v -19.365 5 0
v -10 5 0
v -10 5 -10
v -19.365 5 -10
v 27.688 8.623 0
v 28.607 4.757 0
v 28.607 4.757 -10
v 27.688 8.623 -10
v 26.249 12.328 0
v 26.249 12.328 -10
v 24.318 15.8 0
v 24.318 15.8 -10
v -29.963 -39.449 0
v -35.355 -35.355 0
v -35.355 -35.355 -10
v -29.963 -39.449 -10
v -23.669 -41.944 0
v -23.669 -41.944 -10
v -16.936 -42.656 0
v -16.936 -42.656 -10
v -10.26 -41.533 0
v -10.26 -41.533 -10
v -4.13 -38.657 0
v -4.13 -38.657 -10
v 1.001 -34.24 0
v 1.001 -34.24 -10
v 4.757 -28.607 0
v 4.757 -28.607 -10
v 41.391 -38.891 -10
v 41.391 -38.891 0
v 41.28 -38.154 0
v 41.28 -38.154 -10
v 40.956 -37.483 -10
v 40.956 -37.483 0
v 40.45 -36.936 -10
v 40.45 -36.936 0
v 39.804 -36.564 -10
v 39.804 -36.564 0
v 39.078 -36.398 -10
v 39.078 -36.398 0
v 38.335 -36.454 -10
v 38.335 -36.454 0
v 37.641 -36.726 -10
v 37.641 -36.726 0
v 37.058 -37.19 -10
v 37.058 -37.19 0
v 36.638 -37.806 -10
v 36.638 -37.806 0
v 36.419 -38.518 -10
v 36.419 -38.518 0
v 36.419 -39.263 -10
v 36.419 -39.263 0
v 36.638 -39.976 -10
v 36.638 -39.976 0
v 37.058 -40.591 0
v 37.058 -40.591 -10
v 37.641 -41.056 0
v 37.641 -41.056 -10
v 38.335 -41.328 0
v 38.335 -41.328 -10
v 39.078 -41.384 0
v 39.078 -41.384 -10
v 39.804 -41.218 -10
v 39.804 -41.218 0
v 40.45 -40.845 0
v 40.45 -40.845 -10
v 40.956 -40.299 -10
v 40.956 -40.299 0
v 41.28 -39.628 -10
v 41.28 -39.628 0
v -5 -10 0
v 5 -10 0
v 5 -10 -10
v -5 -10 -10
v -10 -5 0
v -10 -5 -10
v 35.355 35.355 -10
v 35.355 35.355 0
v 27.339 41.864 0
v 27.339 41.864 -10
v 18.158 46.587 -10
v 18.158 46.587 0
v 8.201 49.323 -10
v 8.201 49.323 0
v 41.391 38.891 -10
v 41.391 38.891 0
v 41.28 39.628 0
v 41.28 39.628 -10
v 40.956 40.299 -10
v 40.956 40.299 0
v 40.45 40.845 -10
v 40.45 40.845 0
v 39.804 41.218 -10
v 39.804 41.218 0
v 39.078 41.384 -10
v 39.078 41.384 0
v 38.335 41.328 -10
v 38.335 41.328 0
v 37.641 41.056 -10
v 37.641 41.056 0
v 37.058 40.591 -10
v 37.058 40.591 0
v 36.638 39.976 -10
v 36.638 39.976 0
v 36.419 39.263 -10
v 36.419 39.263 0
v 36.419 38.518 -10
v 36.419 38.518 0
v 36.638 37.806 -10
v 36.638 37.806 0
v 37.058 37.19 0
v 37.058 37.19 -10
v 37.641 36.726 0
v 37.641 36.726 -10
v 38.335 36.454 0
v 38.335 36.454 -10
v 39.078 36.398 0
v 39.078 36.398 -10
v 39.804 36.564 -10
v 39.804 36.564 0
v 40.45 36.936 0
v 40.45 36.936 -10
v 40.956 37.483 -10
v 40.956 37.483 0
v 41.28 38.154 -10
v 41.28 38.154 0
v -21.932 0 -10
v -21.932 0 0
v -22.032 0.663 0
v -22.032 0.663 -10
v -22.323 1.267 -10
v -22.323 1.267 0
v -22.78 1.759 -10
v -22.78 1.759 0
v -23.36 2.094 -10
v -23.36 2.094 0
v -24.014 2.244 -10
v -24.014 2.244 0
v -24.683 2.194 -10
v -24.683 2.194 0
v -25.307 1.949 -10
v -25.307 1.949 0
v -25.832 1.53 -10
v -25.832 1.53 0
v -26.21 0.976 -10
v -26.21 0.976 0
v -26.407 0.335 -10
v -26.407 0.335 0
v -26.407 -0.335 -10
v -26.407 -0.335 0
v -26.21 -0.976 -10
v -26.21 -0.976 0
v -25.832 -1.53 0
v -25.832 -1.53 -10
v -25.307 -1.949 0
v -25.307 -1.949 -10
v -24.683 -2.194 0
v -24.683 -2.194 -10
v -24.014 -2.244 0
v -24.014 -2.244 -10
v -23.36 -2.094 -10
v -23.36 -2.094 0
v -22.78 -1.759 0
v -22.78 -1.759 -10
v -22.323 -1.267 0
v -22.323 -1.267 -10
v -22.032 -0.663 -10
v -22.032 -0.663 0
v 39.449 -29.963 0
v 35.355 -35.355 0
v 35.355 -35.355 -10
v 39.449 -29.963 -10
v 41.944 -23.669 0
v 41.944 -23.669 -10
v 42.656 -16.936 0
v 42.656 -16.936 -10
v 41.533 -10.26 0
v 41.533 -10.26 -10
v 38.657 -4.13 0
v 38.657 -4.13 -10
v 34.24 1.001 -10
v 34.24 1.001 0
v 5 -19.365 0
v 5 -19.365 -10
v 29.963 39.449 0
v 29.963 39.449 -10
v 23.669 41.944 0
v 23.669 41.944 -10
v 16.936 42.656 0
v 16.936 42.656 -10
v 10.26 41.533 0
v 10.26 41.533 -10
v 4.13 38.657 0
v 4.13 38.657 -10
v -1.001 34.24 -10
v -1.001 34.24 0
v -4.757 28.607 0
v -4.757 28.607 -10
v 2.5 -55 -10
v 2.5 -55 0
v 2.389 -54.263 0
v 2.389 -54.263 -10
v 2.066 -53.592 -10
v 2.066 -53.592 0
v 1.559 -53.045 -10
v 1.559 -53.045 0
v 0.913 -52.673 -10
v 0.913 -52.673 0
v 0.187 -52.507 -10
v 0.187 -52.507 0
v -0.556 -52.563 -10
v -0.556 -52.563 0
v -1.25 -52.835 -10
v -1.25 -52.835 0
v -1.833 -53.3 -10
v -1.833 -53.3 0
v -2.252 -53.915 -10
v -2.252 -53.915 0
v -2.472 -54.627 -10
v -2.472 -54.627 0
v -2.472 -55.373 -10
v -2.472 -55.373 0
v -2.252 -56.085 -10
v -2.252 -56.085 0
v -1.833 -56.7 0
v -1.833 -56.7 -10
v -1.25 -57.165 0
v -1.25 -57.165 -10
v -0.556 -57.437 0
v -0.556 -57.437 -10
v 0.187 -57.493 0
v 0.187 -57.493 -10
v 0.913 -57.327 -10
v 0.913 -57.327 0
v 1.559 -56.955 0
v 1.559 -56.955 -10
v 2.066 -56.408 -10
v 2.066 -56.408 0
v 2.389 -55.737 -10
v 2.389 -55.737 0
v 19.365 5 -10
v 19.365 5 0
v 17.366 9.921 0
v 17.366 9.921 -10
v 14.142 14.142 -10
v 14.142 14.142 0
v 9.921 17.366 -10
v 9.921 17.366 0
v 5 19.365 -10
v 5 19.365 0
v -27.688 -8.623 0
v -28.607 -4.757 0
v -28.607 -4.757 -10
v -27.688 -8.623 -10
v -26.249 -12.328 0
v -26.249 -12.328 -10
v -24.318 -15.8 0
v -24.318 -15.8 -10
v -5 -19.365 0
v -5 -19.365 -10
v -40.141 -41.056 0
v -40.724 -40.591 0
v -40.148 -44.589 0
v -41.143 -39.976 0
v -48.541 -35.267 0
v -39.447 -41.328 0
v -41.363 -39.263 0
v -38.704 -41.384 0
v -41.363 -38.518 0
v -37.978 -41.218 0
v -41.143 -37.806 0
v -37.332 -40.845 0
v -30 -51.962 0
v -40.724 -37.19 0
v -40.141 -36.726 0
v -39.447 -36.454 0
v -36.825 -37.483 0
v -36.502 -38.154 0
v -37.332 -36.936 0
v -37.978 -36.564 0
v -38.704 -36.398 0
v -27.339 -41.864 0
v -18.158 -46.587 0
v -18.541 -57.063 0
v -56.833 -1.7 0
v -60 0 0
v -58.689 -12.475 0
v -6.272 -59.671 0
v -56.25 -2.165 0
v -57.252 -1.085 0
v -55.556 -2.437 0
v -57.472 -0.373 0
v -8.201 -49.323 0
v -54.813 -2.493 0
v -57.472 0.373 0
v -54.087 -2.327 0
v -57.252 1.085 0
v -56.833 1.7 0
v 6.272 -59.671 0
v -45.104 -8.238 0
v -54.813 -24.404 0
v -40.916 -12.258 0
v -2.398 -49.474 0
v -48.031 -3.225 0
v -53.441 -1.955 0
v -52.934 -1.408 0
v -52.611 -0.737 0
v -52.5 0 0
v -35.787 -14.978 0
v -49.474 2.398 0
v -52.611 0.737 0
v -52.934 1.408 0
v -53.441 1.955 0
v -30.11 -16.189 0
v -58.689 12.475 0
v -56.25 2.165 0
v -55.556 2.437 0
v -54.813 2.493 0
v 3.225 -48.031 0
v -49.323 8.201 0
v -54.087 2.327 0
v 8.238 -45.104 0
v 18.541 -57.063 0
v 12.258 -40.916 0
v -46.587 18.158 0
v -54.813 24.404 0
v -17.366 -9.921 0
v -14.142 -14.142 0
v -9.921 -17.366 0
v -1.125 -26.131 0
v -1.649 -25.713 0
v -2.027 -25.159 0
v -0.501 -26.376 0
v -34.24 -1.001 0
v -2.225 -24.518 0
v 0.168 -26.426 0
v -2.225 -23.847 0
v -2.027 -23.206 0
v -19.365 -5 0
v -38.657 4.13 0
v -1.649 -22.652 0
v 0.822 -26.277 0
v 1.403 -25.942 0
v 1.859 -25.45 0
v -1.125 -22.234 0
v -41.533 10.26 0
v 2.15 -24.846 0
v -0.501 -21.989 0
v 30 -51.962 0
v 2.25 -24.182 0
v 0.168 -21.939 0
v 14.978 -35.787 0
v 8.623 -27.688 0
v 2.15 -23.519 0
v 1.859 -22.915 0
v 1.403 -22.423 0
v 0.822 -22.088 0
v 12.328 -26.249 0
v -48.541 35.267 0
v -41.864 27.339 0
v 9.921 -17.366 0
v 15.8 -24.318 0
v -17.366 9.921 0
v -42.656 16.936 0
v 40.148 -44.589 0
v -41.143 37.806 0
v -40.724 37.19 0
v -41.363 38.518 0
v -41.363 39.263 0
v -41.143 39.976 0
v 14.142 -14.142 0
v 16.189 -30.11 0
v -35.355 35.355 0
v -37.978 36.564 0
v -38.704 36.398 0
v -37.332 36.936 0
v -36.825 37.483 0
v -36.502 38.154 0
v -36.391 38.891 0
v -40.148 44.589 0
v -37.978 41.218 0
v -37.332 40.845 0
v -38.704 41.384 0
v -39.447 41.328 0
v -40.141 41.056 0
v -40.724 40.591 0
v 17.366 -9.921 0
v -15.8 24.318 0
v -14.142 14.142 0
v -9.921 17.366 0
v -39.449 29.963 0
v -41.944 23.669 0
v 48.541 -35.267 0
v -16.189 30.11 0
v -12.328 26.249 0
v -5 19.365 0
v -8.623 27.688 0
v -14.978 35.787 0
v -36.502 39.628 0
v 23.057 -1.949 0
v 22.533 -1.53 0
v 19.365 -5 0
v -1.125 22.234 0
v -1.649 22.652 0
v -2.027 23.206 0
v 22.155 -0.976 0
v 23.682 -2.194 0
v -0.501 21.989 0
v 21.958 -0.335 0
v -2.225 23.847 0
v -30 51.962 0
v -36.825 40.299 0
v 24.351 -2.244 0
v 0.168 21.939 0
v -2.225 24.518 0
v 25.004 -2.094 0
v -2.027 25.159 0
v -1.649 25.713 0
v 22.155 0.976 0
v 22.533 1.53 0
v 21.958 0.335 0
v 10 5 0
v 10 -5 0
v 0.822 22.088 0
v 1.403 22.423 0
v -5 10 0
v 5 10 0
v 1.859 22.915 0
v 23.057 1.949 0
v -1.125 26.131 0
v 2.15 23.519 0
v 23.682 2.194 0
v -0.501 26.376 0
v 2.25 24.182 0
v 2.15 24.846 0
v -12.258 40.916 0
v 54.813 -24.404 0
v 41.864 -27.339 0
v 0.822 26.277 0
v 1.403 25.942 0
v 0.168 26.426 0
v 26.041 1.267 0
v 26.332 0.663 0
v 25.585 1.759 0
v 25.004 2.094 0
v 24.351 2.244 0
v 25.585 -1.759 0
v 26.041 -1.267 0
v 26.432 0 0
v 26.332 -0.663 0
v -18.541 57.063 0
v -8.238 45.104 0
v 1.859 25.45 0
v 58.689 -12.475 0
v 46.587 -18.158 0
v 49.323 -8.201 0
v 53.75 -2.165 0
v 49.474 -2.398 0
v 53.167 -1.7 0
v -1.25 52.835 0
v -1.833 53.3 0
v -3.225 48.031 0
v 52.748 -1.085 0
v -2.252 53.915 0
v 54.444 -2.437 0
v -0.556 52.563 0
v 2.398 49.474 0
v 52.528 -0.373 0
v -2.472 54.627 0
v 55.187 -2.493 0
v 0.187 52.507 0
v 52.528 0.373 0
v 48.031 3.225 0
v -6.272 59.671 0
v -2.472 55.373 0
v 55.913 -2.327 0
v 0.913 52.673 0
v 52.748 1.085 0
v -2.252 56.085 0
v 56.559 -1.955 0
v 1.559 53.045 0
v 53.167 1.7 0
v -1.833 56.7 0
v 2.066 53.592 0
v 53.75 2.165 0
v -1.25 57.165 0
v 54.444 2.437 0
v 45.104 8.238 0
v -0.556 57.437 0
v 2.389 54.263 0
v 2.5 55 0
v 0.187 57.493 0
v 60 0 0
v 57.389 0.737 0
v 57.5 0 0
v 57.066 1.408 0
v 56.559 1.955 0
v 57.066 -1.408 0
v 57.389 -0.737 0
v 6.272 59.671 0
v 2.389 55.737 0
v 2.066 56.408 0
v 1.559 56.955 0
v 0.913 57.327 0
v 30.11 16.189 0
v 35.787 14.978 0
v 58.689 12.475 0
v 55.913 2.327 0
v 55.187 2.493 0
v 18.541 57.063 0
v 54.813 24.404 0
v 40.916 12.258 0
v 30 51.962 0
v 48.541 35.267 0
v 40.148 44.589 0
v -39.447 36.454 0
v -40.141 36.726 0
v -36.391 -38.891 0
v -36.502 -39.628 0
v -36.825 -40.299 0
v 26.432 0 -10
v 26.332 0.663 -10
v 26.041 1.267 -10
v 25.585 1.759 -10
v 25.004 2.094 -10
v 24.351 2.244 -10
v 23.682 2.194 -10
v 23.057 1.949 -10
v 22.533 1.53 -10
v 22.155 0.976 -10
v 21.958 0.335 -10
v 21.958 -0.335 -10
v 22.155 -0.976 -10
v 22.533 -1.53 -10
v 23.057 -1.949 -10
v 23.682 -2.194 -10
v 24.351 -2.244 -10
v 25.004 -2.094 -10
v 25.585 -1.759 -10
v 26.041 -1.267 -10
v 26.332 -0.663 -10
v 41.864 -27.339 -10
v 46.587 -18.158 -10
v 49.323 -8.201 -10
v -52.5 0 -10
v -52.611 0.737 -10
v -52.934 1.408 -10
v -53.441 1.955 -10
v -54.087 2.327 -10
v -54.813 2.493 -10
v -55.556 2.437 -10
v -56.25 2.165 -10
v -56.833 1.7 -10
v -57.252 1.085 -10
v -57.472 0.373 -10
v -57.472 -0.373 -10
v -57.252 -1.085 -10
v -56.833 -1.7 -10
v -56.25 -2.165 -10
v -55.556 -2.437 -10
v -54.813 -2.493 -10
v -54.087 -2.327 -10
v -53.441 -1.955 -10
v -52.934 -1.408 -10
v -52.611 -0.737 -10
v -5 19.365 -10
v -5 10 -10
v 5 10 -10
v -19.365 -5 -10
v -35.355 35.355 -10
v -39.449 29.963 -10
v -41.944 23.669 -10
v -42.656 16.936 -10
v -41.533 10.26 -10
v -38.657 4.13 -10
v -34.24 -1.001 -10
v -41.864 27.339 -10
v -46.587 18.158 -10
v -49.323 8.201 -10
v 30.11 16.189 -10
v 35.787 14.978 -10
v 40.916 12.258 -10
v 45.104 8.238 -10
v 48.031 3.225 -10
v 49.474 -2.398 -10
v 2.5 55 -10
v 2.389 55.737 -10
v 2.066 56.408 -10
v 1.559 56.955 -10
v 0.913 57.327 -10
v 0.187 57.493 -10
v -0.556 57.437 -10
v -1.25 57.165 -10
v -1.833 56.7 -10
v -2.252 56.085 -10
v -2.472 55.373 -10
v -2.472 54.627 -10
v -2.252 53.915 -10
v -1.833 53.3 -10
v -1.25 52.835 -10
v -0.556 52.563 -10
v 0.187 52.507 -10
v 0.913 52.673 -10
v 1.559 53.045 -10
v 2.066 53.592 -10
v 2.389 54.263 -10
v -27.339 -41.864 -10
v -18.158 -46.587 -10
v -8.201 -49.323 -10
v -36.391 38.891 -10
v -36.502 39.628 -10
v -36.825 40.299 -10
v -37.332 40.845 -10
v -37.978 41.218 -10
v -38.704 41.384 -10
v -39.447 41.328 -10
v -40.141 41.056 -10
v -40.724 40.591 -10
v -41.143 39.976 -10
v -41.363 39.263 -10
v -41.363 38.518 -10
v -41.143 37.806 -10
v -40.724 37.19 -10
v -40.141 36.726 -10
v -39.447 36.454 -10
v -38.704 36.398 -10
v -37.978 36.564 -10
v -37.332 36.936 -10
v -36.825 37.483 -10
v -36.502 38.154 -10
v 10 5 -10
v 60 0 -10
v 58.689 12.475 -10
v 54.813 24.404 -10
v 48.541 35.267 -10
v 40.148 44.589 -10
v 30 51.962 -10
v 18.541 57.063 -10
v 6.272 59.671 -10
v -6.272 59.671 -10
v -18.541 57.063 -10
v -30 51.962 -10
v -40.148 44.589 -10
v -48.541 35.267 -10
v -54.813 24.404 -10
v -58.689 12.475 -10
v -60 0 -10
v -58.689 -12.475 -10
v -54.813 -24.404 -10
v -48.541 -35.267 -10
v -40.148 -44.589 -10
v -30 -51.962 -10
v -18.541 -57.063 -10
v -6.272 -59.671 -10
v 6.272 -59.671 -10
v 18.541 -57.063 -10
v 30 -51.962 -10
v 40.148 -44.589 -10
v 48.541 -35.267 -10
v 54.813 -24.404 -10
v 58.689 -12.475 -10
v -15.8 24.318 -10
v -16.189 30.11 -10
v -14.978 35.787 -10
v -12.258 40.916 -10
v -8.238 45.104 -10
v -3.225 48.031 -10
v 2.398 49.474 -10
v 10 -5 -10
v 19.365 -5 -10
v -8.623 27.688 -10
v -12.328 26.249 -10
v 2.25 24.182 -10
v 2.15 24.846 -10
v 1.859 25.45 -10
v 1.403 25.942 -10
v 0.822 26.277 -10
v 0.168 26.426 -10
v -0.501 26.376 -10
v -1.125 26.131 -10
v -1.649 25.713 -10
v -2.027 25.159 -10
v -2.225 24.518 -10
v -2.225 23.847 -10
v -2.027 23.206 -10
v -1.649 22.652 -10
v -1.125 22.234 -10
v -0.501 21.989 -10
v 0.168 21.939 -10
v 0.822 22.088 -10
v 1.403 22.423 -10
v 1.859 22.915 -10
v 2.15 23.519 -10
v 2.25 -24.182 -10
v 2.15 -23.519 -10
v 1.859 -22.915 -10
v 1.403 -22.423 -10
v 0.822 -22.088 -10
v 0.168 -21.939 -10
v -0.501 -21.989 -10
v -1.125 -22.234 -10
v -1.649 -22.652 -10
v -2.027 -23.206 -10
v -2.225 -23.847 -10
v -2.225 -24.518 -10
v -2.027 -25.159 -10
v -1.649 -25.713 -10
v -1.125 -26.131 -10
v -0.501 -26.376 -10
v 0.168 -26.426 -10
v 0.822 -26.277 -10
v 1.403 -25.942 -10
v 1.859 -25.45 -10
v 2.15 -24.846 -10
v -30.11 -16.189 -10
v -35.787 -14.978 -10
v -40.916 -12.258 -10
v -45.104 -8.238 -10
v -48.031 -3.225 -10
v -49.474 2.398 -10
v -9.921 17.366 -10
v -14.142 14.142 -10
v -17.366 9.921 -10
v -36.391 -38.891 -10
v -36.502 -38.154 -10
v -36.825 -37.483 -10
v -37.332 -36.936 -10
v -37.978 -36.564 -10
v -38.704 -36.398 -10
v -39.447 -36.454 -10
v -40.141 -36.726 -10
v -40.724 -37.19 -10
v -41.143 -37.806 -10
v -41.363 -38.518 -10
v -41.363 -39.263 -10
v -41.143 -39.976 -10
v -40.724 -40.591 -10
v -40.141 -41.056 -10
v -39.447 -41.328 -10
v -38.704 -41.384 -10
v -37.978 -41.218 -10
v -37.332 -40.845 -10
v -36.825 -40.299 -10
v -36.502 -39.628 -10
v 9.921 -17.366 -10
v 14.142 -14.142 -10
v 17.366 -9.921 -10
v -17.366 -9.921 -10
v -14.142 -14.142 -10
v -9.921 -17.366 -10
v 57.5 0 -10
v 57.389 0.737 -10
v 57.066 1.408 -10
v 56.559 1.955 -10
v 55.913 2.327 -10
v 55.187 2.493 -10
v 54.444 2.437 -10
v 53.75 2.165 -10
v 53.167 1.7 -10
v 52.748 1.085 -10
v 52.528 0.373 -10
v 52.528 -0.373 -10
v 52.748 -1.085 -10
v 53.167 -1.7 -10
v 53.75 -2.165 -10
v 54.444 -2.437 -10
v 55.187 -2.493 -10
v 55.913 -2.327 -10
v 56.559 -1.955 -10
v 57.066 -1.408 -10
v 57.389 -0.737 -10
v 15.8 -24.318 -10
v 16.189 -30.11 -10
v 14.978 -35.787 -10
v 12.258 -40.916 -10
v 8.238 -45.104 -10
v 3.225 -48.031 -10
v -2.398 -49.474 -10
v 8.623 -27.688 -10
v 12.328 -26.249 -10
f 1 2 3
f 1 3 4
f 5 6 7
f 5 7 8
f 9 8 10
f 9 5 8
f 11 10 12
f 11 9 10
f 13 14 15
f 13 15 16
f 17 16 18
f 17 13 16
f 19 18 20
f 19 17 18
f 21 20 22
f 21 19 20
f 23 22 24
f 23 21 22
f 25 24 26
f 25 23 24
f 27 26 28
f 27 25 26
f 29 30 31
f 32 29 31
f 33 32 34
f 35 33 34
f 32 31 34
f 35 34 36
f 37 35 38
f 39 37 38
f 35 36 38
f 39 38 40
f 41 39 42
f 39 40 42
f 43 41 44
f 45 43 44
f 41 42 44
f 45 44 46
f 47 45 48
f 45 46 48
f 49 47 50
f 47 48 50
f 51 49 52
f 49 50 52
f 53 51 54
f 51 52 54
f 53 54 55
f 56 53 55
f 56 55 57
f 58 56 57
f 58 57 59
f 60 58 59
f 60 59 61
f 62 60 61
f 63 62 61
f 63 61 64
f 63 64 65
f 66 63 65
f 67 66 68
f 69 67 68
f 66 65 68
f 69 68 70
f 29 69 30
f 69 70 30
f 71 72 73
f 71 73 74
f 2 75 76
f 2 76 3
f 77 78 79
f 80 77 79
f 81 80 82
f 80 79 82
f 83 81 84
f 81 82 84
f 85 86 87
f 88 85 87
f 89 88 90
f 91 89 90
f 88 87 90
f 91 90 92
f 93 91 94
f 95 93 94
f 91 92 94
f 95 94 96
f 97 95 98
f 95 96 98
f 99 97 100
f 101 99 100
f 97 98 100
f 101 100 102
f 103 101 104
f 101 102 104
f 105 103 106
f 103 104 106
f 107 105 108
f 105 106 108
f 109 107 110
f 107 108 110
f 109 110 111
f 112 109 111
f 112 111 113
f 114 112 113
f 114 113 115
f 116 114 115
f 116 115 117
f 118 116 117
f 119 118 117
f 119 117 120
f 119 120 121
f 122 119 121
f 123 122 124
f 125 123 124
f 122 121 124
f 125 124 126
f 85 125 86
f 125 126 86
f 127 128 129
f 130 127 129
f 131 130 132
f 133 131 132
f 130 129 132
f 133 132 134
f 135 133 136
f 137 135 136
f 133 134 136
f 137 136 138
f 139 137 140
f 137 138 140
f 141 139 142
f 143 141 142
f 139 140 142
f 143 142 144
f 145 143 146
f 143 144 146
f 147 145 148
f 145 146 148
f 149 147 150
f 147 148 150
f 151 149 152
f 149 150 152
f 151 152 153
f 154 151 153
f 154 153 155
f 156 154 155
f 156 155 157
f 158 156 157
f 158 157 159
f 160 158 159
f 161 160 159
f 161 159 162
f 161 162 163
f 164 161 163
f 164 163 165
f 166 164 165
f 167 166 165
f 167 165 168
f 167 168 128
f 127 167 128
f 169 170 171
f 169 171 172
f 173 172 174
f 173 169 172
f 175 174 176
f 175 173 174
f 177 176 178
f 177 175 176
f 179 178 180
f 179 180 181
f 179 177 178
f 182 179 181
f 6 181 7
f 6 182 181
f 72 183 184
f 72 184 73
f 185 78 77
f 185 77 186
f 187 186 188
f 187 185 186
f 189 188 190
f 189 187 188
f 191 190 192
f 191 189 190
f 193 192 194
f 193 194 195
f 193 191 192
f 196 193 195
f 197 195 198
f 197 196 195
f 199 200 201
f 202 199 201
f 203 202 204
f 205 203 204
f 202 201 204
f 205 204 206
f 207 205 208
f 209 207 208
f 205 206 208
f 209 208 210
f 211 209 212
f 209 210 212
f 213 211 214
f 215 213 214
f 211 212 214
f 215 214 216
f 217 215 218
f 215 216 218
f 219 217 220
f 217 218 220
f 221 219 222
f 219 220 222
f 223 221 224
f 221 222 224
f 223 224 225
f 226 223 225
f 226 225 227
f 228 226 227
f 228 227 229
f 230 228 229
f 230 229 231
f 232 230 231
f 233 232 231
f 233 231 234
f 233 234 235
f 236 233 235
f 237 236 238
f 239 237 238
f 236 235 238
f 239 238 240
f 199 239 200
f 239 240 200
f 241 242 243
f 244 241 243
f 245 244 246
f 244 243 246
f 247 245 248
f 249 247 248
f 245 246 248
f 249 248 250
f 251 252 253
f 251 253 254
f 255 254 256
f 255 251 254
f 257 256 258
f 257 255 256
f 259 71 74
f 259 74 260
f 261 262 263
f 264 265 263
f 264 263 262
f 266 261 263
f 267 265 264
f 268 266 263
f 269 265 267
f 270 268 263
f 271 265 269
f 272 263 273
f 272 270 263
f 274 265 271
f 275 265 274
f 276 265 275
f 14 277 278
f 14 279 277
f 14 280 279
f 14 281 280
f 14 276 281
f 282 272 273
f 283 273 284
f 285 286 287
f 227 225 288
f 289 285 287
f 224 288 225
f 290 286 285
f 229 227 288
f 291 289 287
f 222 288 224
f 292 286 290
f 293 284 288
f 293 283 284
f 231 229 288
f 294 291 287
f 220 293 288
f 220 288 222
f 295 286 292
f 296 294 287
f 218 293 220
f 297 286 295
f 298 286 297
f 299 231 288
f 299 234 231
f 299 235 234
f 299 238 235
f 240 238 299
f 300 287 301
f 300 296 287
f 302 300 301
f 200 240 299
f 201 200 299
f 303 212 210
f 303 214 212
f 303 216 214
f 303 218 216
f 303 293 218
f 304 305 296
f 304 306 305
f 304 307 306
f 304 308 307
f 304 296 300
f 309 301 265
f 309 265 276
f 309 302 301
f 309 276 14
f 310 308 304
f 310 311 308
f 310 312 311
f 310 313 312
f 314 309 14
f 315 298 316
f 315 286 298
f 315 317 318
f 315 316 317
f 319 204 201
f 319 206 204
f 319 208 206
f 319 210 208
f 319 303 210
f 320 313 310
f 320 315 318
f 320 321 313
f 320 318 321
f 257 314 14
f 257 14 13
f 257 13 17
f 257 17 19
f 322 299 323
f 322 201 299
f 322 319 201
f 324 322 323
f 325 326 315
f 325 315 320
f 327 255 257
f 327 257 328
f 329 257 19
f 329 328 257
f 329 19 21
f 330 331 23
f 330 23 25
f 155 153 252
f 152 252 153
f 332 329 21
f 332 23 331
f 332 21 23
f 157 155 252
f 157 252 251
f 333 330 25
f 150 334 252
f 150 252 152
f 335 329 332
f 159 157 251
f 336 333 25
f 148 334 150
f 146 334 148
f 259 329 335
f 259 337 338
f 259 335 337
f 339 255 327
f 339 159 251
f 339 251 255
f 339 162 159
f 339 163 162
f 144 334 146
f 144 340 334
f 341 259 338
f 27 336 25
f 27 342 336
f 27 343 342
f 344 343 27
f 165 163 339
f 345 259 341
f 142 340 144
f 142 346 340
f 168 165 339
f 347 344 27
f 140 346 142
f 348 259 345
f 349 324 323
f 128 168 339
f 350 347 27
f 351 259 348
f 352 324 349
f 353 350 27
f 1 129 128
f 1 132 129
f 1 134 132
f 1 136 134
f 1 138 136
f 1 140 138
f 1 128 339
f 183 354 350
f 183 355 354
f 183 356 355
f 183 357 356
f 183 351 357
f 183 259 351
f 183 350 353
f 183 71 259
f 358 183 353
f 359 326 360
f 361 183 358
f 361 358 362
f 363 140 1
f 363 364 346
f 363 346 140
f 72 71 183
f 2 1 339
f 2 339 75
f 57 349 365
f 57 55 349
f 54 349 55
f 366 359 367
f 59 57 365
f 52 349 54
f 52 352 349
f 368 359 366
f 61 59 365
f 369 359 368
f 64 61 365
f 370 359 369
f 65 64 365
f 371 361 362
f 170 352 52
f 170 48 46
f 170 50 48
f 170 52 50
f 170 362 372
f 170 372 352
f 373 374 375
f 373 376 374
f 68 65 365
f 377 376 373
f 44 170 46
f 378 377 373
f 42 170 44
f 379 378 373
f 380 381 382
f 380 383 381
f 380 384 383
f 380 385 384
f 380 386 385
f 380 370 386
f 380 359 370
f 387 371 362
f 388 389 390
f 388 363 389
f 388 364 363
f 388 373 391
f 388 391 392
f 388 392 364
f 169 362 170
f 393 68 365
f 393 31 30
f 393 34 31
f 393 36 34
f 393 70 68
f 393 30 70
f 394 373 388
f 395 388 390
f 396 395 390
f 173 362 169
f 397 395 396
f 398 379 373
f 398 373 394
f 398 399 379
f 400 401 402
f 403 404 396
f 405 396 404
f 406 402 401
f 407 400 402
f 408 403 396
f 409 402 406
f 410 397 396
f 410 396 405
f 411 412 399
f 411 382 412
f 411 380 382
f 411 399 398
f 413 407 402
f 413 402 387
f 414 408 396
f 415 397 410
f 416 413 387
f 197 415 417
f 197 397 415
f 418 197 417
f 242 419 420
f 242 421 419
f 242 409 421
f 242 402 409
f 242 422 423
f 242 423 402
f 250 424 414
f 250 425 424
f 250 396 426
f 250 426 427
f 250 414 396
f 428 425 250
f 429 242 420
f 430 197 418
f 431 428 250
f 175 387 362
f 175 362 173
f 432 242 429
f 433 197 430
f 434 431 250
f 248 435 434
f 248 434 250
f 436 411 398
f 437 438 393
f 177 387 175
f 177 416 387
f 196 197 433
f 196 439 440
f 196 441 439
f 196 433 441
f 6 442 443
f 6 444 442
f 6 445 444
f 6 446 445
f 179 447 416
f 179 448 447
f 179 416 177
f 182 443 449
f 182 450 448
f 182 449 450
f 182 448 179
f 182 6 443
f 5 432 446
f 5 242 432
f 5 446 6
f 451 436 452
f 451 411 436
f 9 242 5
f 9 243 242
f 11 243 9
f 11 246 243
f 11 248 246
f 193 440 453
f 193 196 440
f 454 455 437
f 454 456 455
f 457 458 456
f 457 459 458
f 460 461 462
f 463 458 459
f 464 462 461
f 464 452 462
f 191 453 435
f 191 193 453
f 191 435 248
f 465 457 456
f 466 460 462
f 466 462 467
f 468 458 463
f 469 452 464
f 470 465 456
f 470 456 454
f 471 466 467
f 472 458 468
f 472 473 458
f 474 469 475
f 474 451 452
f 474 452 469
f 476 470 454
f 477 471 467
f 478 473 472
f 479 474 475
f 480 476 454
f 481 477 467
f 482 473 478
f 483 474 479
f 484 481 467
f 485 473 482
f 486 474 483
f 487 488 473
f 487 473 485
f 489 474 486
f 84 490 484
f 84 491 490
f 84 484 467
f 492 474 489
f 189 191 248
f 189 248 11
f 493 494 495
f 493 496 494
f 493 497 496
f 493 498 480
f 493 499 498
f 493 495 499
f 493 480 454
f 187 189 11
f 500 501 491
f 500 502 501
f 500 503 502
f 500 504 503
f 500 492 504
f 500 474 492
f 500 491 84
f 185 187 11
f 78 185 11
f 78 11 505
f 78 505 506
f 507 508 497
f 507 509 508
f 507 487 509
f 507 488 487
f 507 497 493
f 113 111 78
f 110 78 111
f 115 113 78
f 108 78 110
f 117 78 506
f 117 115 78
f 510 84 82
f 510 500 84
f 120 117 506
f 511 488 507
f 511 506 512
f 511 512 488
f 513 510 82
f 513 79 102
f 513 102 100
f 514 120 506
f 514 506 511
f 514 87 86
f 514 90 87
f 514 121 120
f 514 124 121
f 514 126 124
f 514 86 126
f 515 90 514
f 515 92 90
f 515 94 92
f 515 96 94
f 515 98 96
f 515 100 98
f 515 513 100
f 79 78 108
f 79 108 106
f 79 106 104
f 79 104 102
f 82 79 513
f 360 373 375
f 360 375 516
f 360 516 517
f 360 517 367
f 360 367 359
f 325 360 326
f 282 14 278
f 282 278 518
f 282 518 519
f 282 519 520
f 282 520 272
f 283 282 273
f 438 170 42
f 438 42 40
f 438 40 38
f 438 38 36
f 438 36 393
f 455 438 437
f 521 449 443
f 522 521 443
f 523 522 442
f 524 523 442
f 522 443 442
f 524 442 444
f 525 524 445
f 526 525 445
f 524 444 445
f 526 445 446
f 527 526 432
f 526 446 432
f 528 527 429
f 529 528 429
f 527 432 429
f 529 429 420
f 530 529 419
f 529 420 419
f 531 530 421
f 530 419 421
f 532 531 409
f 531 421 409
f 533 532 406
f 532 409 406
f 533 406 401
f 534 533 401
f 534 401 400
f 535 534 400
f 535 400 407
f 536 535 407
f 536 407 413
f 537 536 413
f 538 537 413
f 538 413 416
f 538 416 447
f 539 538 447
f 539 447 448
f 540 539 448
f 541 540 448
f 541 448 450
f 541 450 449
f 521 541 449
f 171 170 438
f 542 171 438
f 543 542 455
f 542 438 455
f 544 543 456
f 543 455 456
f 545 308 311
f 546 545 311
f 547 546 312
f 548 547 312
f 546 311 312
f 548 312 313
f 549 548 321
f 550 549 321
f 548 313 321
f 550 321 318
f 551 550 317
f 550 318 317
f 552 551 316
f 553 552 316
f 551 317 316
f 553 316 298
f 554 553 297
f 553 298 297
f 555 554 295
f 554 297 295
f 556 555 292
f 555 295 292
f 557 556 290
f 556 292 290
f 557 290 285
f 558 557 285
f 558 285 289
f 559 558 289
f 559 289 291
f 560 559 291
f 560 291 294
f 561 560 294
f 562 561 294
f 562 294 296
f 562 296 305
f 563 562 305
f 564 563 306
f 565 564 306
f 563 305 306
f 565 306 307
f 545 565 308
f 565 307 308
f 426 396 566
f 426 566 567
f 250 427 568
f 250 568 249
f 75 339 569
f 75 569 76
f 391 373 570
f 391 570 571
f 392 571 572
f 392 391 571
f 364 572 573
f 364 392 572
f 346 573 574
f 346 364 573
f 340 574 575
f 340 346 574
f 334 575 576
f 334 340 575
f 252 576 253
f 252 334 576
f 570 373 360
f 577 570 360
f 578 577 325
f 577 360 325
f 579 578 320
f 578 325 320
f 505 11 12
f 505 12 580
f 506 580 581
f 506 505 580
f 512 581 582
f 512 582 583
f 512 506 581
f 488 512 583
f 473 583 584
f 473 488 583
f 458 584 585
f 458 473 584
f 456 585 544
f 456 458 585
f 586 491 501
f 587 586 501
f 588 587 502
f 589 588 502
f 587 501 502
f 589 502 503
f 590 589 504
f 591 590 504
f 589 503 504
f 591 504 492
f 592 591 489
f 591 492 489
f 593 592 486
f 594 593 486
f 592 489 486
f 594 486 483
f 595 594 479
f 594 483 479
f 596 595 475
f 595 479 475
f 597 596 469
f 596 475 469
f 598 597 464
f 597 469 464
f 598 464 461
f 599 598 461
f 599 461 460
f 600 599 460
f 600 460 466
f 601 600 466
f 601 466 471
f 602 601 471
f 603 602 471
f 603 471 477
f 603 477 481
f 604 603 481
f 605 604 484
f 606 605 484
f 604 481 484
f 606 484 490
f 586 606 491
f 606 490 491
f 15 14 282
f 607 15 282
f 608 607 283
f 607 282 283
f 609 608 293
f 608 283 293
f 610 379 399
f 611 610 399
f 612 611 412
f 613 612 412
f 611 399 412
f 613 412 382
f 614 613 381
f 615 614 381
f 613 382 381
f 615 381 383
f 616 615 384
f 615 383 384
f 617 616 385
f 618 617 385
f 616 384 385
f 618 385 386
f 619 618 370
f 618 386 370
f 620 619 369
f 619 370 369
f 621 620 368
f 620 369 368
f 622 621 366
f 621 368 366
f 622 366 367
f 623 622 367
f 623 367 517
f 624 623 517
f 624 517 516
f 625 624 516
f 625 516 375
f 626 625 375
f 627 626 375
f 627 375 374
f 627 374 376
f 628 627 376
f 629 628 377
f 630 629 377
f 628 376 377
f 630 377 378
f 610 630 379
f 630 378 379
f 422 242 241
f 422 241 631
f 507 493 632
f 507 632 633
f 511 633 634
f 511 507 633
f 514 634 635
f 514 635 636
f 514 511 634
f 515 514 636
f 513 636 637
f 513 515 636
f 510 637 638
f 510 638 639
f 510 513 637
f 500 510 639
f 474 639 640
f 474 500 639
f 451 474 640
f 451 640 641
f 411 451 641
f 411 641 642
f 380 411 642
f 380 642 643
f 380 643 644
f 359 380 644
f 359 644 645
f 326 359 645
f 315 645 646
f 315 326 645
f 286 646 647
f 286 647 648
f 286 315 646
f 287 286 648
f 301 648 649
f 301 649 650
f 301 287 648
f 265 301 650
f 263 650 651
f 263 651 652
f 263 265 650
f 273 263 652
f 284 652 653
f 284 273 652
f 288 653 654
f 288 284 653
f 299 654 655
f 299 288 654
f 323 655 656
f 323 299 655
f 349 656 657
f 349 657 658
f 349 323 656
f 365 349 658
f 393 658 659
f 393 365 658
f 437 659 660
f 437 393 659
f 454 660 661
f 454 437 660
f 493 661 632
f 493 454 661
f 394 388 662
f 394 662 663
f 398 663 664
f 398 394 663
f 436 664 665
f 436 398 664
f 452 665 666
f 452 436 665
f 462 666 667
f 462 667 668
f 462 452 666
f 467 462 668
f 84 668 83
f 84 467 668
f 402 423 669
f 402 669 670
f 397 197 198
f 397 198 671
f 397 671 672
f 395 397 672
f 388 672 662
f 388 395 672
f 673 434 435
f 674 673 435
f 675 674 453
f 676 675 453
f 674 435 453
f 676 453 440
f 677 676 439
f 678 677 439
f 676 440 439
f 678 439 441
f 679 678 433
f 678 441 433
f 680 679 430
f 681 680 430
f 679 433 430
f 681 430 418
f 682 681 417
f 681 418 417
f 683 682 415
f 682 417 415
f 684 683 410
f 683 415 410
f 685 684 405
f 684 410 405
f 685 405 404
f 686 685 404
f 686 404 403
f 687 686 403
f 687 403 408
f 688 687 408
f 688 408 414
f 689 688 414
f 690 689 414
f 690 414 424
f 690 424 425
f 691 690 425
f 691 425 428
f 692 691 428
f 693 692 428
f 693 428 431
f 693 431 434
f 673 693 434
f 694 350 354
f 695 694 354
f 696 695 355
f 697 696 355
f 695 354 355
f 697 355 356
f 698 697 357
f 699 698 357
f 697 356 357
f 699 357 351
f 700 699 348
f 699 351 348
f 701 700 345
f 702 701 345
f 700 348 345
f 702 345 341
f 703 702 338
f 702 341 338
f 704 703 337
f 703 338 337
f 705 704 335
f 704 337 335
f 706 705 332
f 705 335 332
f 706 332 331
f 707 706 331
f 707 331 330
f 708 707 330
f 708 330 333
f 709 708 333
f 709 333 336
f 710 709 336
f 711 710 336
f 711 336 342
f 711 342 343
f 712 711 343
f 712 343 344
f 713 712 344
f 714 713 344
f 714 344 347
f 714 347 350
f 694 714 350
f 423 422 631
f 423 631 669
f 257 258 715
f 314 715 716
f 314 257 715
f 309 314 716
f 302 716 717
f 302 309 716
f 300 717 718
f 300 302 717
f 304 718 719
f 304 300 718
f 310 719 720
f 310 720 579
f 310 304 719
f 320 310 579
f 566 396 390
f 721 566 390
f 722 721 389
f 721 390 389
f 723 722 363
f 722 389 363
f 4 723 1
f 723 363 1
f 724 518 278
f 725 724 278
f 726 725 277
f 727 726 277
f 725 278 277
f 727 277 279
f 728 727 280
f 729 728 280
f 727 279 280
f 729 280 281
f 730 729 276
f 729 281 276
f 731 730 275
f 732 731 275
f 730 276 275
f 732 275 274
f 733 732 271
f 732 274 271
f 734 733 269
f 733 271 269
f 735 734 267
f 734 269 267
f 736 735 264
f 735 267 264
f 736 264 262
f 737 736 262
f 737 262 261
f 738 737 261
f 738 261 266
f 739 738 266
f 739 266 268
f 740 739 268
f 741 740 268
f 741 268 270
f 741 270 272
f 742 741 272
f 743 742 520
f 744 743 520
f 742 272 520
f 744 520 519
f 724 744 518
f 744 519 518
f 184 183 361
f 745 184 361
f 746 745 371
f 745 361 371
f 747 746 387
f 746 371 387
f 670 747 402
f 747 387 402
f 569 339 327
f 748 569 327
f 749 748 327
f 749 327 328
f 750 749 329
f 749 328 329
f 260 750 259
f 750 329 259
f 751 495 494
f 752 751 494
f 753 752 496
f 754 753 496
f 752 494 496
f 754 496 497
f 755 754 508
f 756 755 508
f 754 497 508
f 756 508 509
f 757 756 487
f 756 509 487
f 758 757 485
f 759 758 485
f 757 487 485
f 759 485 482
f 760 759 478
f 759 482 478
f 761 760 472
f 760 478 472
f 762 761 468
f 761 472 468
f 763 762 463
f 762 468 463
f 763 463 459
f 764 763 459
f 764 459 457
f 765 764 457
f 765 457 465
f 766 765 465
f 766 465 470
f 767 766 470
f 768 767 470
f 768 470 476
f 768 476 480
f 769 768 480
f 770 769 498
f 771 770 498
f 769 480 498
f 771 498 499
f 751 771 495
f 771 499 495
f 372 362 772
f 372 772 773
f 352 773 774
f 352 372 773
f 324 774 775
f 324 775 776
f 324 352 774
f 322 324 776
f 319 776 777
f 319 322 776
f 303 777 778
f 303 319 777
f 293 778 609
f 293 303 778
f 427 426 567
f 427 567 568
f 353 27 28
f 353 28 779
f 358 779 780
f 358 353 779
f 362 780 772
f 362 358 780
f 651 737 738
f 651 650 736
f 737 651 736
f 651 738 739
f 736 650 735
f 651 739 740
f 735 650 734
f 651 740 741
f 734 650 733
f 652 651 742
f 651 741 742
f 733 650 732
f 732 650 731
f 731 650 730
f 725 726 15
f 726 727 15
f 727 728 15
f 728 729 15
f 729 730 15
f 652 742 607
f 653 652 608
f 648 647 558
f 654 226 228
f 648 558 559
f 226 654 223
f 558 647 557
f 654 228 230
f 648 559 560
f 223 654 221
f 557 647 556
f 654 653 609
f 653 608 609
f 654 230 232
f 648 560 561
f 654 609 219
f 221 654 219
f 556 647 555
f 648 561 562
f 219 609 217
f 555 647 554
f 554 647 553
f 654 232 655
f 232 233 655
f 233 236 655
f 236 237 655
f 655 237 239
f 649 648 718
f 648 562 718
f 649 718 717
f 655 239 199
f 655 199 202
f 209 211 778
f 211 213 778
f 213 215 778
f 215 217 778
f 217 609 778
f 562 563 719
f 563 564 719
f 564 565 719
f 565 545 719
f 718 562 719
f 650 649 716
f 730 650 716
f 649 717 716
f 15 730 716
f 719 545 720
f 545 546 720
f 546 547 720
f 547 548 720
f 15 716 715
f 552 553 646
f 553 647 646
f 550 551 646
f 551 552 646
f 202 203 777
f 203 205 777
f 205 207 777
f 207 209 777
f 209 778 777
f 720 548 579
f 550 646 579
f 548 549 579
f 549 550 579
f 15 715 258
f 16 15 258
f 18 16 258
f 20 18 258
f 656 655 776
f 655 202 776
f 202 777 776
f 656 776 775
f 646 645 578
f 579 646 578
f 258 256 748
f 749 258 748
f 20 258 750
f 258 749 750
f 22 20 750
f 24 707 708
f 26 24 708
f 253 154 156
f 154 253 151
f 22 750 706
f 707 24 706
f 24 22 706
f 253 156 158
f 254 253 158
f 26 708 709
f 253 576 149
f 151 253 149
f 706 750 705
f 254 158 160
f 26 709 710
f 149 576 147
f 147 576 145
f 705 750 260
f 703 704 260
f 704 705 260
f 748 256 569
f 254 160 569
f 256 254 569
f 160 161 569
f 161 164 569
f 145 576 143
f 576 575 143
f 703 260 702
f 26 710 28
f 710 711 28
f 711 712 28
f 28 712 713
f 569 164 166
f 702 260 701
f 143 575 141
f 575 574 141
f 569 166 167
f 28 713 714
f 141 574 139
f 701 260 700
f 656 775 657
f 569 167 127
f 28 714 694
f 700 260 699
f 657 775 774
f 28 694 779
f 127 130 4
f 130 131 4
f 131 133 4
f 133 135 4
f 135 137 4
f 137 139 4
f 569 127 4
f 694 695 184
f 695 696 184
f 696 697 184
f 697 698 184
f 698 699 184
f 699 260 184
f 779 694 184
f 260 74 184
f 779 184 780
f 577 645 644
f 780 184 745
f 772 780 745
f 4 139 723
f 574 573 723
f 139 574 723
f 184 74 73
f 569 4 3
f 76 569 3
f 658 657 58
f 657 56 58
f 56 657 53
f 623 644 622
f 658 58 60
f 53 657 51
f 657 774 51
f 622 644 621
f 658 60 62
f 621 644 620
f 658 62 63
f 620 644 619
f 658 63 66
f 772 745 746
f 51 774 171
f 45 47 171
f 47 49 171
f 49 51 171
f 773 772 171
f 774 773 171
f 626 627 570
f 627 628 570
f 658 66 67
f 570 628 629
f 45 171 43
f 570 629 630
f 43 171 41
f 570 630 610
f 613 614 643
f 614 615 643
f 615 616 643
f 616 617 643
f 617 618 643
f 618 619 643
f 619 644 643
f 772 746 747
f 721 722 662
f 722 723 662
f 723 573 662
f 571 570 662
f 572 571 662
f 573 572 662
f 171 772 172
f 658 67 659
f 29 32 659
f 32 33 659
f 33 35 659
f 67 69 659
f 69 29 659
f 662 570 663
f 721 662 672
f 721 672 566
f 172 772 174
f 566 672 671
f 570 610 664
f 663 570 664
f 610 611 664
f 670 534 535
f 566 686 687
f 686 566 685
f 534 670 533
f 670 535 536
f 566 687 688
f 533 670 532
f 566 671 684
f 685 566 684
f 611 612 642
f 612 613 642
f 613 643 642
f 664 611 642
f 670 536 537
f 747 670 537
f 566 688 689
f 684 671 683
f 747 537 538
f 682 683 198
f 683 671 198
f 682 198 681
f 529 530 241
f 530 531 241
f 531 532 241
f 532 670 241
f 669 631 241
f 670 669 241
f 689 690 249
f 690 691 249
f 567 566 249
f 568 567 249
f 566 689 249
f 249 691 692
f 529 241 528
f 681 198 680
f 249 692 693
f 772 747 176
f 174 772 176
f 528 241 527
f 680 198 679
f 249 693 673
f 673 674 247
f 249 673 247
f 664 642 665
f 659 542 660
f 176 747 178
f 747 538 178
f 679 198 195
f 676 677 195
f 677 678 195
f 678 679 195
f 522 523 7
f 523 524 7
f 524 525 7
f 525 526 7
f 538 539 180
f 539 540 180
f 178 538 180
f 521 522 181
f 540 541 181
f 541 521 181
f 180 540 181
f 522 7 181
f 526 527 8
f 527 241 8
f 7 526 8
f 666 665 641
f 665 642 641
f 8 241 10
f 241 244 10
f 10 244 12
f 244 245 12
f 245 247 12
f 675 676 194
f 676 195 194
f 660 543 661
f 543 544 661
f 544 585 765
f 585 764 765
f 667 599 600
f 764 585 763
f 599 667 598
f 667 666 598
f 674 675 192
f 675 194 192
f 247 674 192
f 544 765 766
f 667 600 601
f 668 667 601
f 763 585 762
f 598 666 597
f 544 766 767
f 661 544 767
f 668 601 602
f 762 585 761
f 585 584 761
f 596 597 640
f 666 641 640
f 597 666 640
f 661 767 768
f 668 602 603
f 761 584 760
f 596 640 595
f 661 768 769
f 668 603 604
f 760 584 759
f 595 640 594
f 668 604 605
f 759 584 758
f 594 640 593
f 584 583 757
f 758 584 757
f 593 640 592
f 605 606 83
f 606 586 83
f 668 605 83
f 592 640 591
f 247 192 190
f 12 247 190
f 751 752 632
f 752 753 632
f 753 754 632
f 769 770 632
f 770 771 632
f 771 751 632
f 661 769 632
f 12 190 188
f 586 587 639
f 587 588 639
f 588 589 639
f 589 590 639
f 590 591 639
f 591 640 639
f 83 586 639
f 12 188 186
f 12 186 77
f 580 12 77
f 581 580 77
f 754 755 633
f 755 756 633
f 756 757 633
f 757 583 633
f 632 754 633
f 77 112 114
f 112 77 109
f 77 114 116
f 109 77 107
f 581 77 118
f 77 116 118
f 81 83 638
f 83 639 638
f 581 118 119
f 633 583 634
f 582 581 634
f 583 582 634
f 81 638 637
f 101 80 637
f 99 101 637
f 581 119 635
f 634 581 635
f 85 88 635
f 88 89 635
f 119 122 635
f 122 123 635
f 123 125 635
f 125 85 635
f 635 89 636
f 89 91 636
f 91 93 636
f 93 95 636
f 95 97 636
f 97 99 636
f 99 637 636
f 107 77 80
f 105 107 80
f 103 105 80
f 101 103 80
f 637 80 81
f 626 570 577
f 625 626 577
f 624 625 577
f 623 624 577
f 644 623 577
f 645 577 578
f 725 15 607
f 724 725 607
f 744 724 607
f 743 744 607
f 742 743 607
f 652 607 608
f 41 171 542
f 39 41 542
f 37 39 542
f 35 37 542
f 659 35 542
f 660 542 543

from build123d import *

# Parameters (mm, degrees)
SKETCH6_R                        = 29
SKETCH6_R_2                      = 20
INNER_RING_DEPTH                 = 10
MOTOR_CONNECTOR_CUT_DEPTH        = 10
SKETCH8_R                        = 2.25
MOTOR_CONNECTOR_HOLES_DEPTH      = 1
MOTOR_CONNECTOR_HOLES_DEPTH_BACK = 18
MIDDLE_PATTERN_DEPTH             = 10
SKETCH9_R                        = 60
SKETCH9_R_2                      = 50
SKETCH9_R_3                      = 2.5
BOSS_EXTRUDE1_DEPTH              = 10


with BuildPart() as part:
    # Sketch6 → Inner Ring (new body)
    with BuildSketch(Plane.XY):
        Circle(SKETCH6_R)
        Circle(SKETCH6_R_2, mode=Mode.SUBTRACT)
    extrude(amount=-INNER_RING_DEPTH)

    # Sketch7 → Motor Connector Cut (add)
    with BuildSketch(Plane.XY):
        with BuildLine():
            ThreePointArc((20, 0), (19.840593925, 2.52008585), (19.364916731, 5))
            Line((19.364916731, 5), (9.999996731, 5))
            Line((9.999996731, 5), (9.999996731, -5))
            Line((9.999996731, -5), (19.364916731, -5))
            ThreePointArc((19.364916731, -5), (19.840593925, -2.52008585), (20, 0))
        make_face()
        with BuildLine():
            ThreePointArc((5, 19.364916731), (0, 20), (-5, 19.364916731))
            Line((-5, 19.364916731), (-5, 9.999996731))
            Line((-5, 9.999996731), (5, 9.999996731))
            Line((5, 9.999996731), (5, 19.364916731))
        make_face()
        with BuildLine():
            Line((-9.999996731, -5), (-9.999996731, 5))
            Line((-9.999996731, 5), (-19.364916731, 5))
            ThreePointArc((-19.364916731, 5), (-20, 0), (-19.364916731, -5))
            Line((-19.364916731, -5), (-9.999996731, -5))
        make_face()
        with BuildLine():
            Line((-5, -9.999996731), (-5, -19.364916731))
            ThreePointArc((-5, -19.364916731), (0, -20), (5, -19.364916731))
            Line((5, -19.364916731), (5, -9.999996731))
            Line((5, -9.999996731), (-5, -9.999996731))
        make_face()
    extrude(amount=-MOTOR_CONNECTOR_CUT_DEPTH)

    # Sketch8 → Motor Connector Holes (cut, two sides)
    with BuildSketch(Plane.XY) as motor_connector_holes_sk:
        with Locations((0, 24.182458366)):
            Circle(SKETCH8_R)
        with Locations((24.182458366, 0)):
            Circle(SKETCH8_R)
        with Locations((0, -24.182458366)):
            Circle(SKETCH8_R)
        with Locations((-24.182458366, 0)):
            Circle(SKETCH8_R)
    extrude(amount=MOTOR_CONNECTOR_HOLES_DEPTH, mode=Mode.SUBTRACT)
    extrude(motor_connector_holes_sk.sketch, amount=-MOTOR_CONNECTOR_HOLES_DEPTH_BACK, mode=Mode.SUBTRACT)

    # Sketch10 → Middle Pattern (add)
    with BuildSketch(Plane.XY):
        with BuildLine():
            ThreePointArc((28.607215414, 4.756808408), (26.539406056, -11.690163651), (15.800414568, -24.317625284))
            ThreePointArc((15.800414568, -24.317625284), (10.393277118, -43.149392299), (-8.201394307, -49.322785114))
            ThreePointArc((-8.201394307, -49.322785114), (15.267827816, -47.611904328), (35.355339059, -35.355339059))
            ThreePointArc((35.355339059, -35.355339059), (42.321804958, -13.559663633), (28.607215414, 4.756808408))
        make_face()
        with BuildLine():
            ThreePointArc((24.317625284, 15.800414568), (43.149392359, 10.39327706), (49.322785087, -8.201394473))
            ThreePointArc((49.322785087, -8.201394473), (47.611904354, 15.267827736), (35.355339059, 35.355339059))
            ThreePointArc((35.355339059, 35.355339059), (13.559663633, 42.321804958), (-4.756808408, 28.607215414))
            ThreePointArc((-4.756808408, 28.607215414), (11.690163651, 26.539406056), (24.317625284, 15.800414568))
        make_face()
        with BuildLine():
            ThreePointArc((8.201394106, 49.322785148), (-15.267827902, 47.611904301), (-35.355339044, 35.355339075))
            ThreePointArc((-35.355339044, 35.355339075), (-42.32180496, 13.559663644), (-28.607215414, -4.756808408))
            ThreePointArc((-28.607215414, -4.756808408), (-26.539406056, 11.690163651), (-15.800414568, 24.317625284))
            ThreePointArc((-15.800414568, 24.317625284), (-10.393277189, 43.149392225), (8.201394106, 49.322785148))
        make_face()
        with BuildLine():
            ThreePointArc((4.756808408, -28.607215414), (-11.690163651, -26.539406056), (-24.317625284, -15.800414568))
            ThreePointArc((-24.317625284, -15.800414568), (-43.149392012, -10.393277393), (-49.322785244, 8.201393524))
            ThreePointArc((-49.322785244, 8.201393524), (-47.61190416, -15.267828343), (-35.355338839, -35.35533928))
            ThreePointArc((-35.355338839, -35.35533928), (-13.559663479, -42.321804932), (4.756808408, -28.607215414))
        make_face()
    extrude(amount=-MIDDLE_PATTERN_DEPTH)

    # Sketch9 → Boss-Extrude1 (add)
    with BuildSketch(Plane.XY):
        Circle(SKETCH9_R)
        Circle(SKETCH9_R_2, mode=Mode.SUBTRACT)
        with Locations((0, 55)):
            Circle(SKETCH9_R_3, mode=Mode.SUBTRACT)
        with Locations((-38.890872965, 38.890872965)):
            Circle(SKETCH9_R_3, mode=Mode.SUBTRACT)
        with Locations((-55, 0)):
            Circle(SKETCH9_R_3, mode=Mode.SUBTRACT)
        with Locations((-38.890872965, -38.890872965)):
            Circle(SKETCH9_R_3, mode=Mode.SUBTRACT)
        with Locations((0, -55)):
            Circle(SKETCH9_R_3, mode=Mode.SUBTRACT)
        with Locations((38.890872965, -38.890872965)):
            Circle(SKETCH9_R_3, mode=Mode.SUBTRACT)
        with Locations((55, 0)):
            Circle(SKETCH9_R_3, mode=Mode.SUBTRACT)
        with Locations((38.890872965, 38.890872965)):
            Circle(SKETCH9_R_3, mode=Mode.SUBTRACT)
    extrude(amount=-BOSS_EXTRUDE1_DEPTH)


solid = part.part
